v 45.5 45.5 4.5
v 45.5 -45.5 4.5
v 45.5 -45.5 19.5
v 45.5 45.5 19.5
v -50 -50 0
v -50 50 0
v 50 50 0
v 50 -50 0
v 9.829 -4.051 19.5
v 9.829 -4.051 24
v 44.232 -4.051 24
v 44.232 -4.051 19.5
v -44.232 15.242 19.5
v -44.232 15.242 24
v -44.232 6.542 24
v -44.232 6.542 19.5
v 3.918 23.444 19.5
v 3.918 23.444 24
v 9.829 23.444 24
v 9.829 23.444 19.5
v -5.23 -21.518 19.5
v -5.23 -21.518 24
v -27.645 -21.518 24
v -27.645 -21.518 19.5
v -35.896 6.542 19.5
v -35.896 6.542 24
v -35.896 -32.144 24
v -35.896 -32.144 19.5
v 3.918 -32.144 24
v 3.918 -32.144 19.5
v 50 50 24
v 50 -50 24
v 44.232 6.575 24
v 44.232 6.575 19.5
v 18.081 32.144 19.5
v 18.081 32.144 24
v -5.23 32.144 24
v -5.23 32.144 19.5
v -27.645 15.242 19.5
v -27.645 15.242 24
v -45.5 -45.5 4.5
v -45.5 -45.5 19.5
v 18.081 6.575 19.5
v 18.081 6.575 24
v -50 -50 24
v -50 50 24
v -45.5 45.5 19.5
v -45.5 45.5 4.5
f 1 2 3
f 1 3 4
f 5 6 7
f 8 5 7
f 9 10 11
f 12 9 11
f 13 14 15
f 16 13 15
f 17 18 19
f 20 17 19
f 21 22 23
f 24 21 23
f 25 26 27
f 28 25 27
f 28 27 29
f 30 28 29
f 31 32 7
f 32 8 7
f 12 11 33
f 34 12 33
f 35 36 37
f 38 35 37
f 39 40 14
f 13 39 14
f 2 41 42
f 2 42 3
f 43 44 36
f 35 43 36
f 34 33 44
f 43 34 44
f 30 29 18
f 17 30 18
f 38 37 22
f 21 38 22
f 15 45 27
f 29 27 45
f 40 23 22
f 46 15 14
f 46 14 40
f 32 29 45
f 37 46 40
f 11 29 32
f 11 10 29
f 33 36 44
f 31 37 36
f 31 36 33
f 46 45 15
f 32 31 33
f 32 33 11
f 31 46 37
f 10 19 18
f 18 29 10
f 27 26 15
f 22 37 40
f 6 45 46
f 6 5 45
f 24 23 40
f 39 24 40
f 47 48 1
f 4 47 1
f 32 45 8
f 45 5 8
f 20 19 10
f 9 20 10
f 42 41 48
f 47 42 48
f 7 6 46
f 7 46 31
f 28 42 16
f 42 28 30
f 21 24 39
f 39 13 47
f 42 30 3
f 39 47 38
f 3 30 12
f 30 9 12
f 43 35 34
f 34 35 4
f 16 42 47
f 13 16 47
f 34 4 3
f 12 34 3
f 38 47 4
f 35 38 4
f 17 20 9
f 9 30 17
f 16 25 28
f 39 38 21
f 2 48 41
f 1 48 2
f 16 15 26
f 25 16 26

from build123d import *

# Parameters (mm, degrees)
F0_W     = 100
F0_H     = 100
F1_DEPTH = 4.5
F2_W     = 100
F2_H     = 100
F2_W_2   = 91
F2_H_2   = 91
F3_DEPTH = 15
F4_W     = 100
F4_H     = 100
F5_DEPTH = 4.5
F7_DEPTH = 6


with BuildPart() as f1:
    # F0 (on Top) → F1 (new body)
    with BuildSketch(Plane.XY):
        Rectangle(F0_W, F0_H)
    extrude(amount=F1_DEPTH)

    # F2 (on face) → F3 (join)
    with BuildSketch(Plane.XY.offset(4.5)):
        Rectangle(F2_W, F2_H)
        Rectangle(F2_W_2, F2_H_2, mode=Mode.SUBTRACT)
    extrude(amount=F3_DEPTH)

    # F4 (on face) → F5 (join)
    with BuildSketch(Plane.XY.offset(19.5)):
        Rectangle(F4_W, F4_H)
    extrude(amount=F5_DEPTH)

    # F6 (on face) → F7 (cut)
    with BuildSketch(Plane.XY.offset(24)):
        Polygon((44.2315, -2.125047), (44.2315, 6.574953), (18.081121, 6.574953), (18.081121, 32.144), (-5.230078, 32.144), (-5.230078, -21.518026), (-27.644688, -21.518026), (-27.644688, 15.241936), (-44.2315, 15.241936), (-44.2315, 6.541936), (-35.896394, 6.541936), (-35.896394, -32.144), (3.918216, -32.144), (3.918216, 23.444234), (9.829416, 23.444234), (9.829416, -4.051022), (44.2315, -4.051022), align=None)
    extrude(amount=-F7_DEPTH, mode=Mode.SUBTRACT)


solid = f1.part
